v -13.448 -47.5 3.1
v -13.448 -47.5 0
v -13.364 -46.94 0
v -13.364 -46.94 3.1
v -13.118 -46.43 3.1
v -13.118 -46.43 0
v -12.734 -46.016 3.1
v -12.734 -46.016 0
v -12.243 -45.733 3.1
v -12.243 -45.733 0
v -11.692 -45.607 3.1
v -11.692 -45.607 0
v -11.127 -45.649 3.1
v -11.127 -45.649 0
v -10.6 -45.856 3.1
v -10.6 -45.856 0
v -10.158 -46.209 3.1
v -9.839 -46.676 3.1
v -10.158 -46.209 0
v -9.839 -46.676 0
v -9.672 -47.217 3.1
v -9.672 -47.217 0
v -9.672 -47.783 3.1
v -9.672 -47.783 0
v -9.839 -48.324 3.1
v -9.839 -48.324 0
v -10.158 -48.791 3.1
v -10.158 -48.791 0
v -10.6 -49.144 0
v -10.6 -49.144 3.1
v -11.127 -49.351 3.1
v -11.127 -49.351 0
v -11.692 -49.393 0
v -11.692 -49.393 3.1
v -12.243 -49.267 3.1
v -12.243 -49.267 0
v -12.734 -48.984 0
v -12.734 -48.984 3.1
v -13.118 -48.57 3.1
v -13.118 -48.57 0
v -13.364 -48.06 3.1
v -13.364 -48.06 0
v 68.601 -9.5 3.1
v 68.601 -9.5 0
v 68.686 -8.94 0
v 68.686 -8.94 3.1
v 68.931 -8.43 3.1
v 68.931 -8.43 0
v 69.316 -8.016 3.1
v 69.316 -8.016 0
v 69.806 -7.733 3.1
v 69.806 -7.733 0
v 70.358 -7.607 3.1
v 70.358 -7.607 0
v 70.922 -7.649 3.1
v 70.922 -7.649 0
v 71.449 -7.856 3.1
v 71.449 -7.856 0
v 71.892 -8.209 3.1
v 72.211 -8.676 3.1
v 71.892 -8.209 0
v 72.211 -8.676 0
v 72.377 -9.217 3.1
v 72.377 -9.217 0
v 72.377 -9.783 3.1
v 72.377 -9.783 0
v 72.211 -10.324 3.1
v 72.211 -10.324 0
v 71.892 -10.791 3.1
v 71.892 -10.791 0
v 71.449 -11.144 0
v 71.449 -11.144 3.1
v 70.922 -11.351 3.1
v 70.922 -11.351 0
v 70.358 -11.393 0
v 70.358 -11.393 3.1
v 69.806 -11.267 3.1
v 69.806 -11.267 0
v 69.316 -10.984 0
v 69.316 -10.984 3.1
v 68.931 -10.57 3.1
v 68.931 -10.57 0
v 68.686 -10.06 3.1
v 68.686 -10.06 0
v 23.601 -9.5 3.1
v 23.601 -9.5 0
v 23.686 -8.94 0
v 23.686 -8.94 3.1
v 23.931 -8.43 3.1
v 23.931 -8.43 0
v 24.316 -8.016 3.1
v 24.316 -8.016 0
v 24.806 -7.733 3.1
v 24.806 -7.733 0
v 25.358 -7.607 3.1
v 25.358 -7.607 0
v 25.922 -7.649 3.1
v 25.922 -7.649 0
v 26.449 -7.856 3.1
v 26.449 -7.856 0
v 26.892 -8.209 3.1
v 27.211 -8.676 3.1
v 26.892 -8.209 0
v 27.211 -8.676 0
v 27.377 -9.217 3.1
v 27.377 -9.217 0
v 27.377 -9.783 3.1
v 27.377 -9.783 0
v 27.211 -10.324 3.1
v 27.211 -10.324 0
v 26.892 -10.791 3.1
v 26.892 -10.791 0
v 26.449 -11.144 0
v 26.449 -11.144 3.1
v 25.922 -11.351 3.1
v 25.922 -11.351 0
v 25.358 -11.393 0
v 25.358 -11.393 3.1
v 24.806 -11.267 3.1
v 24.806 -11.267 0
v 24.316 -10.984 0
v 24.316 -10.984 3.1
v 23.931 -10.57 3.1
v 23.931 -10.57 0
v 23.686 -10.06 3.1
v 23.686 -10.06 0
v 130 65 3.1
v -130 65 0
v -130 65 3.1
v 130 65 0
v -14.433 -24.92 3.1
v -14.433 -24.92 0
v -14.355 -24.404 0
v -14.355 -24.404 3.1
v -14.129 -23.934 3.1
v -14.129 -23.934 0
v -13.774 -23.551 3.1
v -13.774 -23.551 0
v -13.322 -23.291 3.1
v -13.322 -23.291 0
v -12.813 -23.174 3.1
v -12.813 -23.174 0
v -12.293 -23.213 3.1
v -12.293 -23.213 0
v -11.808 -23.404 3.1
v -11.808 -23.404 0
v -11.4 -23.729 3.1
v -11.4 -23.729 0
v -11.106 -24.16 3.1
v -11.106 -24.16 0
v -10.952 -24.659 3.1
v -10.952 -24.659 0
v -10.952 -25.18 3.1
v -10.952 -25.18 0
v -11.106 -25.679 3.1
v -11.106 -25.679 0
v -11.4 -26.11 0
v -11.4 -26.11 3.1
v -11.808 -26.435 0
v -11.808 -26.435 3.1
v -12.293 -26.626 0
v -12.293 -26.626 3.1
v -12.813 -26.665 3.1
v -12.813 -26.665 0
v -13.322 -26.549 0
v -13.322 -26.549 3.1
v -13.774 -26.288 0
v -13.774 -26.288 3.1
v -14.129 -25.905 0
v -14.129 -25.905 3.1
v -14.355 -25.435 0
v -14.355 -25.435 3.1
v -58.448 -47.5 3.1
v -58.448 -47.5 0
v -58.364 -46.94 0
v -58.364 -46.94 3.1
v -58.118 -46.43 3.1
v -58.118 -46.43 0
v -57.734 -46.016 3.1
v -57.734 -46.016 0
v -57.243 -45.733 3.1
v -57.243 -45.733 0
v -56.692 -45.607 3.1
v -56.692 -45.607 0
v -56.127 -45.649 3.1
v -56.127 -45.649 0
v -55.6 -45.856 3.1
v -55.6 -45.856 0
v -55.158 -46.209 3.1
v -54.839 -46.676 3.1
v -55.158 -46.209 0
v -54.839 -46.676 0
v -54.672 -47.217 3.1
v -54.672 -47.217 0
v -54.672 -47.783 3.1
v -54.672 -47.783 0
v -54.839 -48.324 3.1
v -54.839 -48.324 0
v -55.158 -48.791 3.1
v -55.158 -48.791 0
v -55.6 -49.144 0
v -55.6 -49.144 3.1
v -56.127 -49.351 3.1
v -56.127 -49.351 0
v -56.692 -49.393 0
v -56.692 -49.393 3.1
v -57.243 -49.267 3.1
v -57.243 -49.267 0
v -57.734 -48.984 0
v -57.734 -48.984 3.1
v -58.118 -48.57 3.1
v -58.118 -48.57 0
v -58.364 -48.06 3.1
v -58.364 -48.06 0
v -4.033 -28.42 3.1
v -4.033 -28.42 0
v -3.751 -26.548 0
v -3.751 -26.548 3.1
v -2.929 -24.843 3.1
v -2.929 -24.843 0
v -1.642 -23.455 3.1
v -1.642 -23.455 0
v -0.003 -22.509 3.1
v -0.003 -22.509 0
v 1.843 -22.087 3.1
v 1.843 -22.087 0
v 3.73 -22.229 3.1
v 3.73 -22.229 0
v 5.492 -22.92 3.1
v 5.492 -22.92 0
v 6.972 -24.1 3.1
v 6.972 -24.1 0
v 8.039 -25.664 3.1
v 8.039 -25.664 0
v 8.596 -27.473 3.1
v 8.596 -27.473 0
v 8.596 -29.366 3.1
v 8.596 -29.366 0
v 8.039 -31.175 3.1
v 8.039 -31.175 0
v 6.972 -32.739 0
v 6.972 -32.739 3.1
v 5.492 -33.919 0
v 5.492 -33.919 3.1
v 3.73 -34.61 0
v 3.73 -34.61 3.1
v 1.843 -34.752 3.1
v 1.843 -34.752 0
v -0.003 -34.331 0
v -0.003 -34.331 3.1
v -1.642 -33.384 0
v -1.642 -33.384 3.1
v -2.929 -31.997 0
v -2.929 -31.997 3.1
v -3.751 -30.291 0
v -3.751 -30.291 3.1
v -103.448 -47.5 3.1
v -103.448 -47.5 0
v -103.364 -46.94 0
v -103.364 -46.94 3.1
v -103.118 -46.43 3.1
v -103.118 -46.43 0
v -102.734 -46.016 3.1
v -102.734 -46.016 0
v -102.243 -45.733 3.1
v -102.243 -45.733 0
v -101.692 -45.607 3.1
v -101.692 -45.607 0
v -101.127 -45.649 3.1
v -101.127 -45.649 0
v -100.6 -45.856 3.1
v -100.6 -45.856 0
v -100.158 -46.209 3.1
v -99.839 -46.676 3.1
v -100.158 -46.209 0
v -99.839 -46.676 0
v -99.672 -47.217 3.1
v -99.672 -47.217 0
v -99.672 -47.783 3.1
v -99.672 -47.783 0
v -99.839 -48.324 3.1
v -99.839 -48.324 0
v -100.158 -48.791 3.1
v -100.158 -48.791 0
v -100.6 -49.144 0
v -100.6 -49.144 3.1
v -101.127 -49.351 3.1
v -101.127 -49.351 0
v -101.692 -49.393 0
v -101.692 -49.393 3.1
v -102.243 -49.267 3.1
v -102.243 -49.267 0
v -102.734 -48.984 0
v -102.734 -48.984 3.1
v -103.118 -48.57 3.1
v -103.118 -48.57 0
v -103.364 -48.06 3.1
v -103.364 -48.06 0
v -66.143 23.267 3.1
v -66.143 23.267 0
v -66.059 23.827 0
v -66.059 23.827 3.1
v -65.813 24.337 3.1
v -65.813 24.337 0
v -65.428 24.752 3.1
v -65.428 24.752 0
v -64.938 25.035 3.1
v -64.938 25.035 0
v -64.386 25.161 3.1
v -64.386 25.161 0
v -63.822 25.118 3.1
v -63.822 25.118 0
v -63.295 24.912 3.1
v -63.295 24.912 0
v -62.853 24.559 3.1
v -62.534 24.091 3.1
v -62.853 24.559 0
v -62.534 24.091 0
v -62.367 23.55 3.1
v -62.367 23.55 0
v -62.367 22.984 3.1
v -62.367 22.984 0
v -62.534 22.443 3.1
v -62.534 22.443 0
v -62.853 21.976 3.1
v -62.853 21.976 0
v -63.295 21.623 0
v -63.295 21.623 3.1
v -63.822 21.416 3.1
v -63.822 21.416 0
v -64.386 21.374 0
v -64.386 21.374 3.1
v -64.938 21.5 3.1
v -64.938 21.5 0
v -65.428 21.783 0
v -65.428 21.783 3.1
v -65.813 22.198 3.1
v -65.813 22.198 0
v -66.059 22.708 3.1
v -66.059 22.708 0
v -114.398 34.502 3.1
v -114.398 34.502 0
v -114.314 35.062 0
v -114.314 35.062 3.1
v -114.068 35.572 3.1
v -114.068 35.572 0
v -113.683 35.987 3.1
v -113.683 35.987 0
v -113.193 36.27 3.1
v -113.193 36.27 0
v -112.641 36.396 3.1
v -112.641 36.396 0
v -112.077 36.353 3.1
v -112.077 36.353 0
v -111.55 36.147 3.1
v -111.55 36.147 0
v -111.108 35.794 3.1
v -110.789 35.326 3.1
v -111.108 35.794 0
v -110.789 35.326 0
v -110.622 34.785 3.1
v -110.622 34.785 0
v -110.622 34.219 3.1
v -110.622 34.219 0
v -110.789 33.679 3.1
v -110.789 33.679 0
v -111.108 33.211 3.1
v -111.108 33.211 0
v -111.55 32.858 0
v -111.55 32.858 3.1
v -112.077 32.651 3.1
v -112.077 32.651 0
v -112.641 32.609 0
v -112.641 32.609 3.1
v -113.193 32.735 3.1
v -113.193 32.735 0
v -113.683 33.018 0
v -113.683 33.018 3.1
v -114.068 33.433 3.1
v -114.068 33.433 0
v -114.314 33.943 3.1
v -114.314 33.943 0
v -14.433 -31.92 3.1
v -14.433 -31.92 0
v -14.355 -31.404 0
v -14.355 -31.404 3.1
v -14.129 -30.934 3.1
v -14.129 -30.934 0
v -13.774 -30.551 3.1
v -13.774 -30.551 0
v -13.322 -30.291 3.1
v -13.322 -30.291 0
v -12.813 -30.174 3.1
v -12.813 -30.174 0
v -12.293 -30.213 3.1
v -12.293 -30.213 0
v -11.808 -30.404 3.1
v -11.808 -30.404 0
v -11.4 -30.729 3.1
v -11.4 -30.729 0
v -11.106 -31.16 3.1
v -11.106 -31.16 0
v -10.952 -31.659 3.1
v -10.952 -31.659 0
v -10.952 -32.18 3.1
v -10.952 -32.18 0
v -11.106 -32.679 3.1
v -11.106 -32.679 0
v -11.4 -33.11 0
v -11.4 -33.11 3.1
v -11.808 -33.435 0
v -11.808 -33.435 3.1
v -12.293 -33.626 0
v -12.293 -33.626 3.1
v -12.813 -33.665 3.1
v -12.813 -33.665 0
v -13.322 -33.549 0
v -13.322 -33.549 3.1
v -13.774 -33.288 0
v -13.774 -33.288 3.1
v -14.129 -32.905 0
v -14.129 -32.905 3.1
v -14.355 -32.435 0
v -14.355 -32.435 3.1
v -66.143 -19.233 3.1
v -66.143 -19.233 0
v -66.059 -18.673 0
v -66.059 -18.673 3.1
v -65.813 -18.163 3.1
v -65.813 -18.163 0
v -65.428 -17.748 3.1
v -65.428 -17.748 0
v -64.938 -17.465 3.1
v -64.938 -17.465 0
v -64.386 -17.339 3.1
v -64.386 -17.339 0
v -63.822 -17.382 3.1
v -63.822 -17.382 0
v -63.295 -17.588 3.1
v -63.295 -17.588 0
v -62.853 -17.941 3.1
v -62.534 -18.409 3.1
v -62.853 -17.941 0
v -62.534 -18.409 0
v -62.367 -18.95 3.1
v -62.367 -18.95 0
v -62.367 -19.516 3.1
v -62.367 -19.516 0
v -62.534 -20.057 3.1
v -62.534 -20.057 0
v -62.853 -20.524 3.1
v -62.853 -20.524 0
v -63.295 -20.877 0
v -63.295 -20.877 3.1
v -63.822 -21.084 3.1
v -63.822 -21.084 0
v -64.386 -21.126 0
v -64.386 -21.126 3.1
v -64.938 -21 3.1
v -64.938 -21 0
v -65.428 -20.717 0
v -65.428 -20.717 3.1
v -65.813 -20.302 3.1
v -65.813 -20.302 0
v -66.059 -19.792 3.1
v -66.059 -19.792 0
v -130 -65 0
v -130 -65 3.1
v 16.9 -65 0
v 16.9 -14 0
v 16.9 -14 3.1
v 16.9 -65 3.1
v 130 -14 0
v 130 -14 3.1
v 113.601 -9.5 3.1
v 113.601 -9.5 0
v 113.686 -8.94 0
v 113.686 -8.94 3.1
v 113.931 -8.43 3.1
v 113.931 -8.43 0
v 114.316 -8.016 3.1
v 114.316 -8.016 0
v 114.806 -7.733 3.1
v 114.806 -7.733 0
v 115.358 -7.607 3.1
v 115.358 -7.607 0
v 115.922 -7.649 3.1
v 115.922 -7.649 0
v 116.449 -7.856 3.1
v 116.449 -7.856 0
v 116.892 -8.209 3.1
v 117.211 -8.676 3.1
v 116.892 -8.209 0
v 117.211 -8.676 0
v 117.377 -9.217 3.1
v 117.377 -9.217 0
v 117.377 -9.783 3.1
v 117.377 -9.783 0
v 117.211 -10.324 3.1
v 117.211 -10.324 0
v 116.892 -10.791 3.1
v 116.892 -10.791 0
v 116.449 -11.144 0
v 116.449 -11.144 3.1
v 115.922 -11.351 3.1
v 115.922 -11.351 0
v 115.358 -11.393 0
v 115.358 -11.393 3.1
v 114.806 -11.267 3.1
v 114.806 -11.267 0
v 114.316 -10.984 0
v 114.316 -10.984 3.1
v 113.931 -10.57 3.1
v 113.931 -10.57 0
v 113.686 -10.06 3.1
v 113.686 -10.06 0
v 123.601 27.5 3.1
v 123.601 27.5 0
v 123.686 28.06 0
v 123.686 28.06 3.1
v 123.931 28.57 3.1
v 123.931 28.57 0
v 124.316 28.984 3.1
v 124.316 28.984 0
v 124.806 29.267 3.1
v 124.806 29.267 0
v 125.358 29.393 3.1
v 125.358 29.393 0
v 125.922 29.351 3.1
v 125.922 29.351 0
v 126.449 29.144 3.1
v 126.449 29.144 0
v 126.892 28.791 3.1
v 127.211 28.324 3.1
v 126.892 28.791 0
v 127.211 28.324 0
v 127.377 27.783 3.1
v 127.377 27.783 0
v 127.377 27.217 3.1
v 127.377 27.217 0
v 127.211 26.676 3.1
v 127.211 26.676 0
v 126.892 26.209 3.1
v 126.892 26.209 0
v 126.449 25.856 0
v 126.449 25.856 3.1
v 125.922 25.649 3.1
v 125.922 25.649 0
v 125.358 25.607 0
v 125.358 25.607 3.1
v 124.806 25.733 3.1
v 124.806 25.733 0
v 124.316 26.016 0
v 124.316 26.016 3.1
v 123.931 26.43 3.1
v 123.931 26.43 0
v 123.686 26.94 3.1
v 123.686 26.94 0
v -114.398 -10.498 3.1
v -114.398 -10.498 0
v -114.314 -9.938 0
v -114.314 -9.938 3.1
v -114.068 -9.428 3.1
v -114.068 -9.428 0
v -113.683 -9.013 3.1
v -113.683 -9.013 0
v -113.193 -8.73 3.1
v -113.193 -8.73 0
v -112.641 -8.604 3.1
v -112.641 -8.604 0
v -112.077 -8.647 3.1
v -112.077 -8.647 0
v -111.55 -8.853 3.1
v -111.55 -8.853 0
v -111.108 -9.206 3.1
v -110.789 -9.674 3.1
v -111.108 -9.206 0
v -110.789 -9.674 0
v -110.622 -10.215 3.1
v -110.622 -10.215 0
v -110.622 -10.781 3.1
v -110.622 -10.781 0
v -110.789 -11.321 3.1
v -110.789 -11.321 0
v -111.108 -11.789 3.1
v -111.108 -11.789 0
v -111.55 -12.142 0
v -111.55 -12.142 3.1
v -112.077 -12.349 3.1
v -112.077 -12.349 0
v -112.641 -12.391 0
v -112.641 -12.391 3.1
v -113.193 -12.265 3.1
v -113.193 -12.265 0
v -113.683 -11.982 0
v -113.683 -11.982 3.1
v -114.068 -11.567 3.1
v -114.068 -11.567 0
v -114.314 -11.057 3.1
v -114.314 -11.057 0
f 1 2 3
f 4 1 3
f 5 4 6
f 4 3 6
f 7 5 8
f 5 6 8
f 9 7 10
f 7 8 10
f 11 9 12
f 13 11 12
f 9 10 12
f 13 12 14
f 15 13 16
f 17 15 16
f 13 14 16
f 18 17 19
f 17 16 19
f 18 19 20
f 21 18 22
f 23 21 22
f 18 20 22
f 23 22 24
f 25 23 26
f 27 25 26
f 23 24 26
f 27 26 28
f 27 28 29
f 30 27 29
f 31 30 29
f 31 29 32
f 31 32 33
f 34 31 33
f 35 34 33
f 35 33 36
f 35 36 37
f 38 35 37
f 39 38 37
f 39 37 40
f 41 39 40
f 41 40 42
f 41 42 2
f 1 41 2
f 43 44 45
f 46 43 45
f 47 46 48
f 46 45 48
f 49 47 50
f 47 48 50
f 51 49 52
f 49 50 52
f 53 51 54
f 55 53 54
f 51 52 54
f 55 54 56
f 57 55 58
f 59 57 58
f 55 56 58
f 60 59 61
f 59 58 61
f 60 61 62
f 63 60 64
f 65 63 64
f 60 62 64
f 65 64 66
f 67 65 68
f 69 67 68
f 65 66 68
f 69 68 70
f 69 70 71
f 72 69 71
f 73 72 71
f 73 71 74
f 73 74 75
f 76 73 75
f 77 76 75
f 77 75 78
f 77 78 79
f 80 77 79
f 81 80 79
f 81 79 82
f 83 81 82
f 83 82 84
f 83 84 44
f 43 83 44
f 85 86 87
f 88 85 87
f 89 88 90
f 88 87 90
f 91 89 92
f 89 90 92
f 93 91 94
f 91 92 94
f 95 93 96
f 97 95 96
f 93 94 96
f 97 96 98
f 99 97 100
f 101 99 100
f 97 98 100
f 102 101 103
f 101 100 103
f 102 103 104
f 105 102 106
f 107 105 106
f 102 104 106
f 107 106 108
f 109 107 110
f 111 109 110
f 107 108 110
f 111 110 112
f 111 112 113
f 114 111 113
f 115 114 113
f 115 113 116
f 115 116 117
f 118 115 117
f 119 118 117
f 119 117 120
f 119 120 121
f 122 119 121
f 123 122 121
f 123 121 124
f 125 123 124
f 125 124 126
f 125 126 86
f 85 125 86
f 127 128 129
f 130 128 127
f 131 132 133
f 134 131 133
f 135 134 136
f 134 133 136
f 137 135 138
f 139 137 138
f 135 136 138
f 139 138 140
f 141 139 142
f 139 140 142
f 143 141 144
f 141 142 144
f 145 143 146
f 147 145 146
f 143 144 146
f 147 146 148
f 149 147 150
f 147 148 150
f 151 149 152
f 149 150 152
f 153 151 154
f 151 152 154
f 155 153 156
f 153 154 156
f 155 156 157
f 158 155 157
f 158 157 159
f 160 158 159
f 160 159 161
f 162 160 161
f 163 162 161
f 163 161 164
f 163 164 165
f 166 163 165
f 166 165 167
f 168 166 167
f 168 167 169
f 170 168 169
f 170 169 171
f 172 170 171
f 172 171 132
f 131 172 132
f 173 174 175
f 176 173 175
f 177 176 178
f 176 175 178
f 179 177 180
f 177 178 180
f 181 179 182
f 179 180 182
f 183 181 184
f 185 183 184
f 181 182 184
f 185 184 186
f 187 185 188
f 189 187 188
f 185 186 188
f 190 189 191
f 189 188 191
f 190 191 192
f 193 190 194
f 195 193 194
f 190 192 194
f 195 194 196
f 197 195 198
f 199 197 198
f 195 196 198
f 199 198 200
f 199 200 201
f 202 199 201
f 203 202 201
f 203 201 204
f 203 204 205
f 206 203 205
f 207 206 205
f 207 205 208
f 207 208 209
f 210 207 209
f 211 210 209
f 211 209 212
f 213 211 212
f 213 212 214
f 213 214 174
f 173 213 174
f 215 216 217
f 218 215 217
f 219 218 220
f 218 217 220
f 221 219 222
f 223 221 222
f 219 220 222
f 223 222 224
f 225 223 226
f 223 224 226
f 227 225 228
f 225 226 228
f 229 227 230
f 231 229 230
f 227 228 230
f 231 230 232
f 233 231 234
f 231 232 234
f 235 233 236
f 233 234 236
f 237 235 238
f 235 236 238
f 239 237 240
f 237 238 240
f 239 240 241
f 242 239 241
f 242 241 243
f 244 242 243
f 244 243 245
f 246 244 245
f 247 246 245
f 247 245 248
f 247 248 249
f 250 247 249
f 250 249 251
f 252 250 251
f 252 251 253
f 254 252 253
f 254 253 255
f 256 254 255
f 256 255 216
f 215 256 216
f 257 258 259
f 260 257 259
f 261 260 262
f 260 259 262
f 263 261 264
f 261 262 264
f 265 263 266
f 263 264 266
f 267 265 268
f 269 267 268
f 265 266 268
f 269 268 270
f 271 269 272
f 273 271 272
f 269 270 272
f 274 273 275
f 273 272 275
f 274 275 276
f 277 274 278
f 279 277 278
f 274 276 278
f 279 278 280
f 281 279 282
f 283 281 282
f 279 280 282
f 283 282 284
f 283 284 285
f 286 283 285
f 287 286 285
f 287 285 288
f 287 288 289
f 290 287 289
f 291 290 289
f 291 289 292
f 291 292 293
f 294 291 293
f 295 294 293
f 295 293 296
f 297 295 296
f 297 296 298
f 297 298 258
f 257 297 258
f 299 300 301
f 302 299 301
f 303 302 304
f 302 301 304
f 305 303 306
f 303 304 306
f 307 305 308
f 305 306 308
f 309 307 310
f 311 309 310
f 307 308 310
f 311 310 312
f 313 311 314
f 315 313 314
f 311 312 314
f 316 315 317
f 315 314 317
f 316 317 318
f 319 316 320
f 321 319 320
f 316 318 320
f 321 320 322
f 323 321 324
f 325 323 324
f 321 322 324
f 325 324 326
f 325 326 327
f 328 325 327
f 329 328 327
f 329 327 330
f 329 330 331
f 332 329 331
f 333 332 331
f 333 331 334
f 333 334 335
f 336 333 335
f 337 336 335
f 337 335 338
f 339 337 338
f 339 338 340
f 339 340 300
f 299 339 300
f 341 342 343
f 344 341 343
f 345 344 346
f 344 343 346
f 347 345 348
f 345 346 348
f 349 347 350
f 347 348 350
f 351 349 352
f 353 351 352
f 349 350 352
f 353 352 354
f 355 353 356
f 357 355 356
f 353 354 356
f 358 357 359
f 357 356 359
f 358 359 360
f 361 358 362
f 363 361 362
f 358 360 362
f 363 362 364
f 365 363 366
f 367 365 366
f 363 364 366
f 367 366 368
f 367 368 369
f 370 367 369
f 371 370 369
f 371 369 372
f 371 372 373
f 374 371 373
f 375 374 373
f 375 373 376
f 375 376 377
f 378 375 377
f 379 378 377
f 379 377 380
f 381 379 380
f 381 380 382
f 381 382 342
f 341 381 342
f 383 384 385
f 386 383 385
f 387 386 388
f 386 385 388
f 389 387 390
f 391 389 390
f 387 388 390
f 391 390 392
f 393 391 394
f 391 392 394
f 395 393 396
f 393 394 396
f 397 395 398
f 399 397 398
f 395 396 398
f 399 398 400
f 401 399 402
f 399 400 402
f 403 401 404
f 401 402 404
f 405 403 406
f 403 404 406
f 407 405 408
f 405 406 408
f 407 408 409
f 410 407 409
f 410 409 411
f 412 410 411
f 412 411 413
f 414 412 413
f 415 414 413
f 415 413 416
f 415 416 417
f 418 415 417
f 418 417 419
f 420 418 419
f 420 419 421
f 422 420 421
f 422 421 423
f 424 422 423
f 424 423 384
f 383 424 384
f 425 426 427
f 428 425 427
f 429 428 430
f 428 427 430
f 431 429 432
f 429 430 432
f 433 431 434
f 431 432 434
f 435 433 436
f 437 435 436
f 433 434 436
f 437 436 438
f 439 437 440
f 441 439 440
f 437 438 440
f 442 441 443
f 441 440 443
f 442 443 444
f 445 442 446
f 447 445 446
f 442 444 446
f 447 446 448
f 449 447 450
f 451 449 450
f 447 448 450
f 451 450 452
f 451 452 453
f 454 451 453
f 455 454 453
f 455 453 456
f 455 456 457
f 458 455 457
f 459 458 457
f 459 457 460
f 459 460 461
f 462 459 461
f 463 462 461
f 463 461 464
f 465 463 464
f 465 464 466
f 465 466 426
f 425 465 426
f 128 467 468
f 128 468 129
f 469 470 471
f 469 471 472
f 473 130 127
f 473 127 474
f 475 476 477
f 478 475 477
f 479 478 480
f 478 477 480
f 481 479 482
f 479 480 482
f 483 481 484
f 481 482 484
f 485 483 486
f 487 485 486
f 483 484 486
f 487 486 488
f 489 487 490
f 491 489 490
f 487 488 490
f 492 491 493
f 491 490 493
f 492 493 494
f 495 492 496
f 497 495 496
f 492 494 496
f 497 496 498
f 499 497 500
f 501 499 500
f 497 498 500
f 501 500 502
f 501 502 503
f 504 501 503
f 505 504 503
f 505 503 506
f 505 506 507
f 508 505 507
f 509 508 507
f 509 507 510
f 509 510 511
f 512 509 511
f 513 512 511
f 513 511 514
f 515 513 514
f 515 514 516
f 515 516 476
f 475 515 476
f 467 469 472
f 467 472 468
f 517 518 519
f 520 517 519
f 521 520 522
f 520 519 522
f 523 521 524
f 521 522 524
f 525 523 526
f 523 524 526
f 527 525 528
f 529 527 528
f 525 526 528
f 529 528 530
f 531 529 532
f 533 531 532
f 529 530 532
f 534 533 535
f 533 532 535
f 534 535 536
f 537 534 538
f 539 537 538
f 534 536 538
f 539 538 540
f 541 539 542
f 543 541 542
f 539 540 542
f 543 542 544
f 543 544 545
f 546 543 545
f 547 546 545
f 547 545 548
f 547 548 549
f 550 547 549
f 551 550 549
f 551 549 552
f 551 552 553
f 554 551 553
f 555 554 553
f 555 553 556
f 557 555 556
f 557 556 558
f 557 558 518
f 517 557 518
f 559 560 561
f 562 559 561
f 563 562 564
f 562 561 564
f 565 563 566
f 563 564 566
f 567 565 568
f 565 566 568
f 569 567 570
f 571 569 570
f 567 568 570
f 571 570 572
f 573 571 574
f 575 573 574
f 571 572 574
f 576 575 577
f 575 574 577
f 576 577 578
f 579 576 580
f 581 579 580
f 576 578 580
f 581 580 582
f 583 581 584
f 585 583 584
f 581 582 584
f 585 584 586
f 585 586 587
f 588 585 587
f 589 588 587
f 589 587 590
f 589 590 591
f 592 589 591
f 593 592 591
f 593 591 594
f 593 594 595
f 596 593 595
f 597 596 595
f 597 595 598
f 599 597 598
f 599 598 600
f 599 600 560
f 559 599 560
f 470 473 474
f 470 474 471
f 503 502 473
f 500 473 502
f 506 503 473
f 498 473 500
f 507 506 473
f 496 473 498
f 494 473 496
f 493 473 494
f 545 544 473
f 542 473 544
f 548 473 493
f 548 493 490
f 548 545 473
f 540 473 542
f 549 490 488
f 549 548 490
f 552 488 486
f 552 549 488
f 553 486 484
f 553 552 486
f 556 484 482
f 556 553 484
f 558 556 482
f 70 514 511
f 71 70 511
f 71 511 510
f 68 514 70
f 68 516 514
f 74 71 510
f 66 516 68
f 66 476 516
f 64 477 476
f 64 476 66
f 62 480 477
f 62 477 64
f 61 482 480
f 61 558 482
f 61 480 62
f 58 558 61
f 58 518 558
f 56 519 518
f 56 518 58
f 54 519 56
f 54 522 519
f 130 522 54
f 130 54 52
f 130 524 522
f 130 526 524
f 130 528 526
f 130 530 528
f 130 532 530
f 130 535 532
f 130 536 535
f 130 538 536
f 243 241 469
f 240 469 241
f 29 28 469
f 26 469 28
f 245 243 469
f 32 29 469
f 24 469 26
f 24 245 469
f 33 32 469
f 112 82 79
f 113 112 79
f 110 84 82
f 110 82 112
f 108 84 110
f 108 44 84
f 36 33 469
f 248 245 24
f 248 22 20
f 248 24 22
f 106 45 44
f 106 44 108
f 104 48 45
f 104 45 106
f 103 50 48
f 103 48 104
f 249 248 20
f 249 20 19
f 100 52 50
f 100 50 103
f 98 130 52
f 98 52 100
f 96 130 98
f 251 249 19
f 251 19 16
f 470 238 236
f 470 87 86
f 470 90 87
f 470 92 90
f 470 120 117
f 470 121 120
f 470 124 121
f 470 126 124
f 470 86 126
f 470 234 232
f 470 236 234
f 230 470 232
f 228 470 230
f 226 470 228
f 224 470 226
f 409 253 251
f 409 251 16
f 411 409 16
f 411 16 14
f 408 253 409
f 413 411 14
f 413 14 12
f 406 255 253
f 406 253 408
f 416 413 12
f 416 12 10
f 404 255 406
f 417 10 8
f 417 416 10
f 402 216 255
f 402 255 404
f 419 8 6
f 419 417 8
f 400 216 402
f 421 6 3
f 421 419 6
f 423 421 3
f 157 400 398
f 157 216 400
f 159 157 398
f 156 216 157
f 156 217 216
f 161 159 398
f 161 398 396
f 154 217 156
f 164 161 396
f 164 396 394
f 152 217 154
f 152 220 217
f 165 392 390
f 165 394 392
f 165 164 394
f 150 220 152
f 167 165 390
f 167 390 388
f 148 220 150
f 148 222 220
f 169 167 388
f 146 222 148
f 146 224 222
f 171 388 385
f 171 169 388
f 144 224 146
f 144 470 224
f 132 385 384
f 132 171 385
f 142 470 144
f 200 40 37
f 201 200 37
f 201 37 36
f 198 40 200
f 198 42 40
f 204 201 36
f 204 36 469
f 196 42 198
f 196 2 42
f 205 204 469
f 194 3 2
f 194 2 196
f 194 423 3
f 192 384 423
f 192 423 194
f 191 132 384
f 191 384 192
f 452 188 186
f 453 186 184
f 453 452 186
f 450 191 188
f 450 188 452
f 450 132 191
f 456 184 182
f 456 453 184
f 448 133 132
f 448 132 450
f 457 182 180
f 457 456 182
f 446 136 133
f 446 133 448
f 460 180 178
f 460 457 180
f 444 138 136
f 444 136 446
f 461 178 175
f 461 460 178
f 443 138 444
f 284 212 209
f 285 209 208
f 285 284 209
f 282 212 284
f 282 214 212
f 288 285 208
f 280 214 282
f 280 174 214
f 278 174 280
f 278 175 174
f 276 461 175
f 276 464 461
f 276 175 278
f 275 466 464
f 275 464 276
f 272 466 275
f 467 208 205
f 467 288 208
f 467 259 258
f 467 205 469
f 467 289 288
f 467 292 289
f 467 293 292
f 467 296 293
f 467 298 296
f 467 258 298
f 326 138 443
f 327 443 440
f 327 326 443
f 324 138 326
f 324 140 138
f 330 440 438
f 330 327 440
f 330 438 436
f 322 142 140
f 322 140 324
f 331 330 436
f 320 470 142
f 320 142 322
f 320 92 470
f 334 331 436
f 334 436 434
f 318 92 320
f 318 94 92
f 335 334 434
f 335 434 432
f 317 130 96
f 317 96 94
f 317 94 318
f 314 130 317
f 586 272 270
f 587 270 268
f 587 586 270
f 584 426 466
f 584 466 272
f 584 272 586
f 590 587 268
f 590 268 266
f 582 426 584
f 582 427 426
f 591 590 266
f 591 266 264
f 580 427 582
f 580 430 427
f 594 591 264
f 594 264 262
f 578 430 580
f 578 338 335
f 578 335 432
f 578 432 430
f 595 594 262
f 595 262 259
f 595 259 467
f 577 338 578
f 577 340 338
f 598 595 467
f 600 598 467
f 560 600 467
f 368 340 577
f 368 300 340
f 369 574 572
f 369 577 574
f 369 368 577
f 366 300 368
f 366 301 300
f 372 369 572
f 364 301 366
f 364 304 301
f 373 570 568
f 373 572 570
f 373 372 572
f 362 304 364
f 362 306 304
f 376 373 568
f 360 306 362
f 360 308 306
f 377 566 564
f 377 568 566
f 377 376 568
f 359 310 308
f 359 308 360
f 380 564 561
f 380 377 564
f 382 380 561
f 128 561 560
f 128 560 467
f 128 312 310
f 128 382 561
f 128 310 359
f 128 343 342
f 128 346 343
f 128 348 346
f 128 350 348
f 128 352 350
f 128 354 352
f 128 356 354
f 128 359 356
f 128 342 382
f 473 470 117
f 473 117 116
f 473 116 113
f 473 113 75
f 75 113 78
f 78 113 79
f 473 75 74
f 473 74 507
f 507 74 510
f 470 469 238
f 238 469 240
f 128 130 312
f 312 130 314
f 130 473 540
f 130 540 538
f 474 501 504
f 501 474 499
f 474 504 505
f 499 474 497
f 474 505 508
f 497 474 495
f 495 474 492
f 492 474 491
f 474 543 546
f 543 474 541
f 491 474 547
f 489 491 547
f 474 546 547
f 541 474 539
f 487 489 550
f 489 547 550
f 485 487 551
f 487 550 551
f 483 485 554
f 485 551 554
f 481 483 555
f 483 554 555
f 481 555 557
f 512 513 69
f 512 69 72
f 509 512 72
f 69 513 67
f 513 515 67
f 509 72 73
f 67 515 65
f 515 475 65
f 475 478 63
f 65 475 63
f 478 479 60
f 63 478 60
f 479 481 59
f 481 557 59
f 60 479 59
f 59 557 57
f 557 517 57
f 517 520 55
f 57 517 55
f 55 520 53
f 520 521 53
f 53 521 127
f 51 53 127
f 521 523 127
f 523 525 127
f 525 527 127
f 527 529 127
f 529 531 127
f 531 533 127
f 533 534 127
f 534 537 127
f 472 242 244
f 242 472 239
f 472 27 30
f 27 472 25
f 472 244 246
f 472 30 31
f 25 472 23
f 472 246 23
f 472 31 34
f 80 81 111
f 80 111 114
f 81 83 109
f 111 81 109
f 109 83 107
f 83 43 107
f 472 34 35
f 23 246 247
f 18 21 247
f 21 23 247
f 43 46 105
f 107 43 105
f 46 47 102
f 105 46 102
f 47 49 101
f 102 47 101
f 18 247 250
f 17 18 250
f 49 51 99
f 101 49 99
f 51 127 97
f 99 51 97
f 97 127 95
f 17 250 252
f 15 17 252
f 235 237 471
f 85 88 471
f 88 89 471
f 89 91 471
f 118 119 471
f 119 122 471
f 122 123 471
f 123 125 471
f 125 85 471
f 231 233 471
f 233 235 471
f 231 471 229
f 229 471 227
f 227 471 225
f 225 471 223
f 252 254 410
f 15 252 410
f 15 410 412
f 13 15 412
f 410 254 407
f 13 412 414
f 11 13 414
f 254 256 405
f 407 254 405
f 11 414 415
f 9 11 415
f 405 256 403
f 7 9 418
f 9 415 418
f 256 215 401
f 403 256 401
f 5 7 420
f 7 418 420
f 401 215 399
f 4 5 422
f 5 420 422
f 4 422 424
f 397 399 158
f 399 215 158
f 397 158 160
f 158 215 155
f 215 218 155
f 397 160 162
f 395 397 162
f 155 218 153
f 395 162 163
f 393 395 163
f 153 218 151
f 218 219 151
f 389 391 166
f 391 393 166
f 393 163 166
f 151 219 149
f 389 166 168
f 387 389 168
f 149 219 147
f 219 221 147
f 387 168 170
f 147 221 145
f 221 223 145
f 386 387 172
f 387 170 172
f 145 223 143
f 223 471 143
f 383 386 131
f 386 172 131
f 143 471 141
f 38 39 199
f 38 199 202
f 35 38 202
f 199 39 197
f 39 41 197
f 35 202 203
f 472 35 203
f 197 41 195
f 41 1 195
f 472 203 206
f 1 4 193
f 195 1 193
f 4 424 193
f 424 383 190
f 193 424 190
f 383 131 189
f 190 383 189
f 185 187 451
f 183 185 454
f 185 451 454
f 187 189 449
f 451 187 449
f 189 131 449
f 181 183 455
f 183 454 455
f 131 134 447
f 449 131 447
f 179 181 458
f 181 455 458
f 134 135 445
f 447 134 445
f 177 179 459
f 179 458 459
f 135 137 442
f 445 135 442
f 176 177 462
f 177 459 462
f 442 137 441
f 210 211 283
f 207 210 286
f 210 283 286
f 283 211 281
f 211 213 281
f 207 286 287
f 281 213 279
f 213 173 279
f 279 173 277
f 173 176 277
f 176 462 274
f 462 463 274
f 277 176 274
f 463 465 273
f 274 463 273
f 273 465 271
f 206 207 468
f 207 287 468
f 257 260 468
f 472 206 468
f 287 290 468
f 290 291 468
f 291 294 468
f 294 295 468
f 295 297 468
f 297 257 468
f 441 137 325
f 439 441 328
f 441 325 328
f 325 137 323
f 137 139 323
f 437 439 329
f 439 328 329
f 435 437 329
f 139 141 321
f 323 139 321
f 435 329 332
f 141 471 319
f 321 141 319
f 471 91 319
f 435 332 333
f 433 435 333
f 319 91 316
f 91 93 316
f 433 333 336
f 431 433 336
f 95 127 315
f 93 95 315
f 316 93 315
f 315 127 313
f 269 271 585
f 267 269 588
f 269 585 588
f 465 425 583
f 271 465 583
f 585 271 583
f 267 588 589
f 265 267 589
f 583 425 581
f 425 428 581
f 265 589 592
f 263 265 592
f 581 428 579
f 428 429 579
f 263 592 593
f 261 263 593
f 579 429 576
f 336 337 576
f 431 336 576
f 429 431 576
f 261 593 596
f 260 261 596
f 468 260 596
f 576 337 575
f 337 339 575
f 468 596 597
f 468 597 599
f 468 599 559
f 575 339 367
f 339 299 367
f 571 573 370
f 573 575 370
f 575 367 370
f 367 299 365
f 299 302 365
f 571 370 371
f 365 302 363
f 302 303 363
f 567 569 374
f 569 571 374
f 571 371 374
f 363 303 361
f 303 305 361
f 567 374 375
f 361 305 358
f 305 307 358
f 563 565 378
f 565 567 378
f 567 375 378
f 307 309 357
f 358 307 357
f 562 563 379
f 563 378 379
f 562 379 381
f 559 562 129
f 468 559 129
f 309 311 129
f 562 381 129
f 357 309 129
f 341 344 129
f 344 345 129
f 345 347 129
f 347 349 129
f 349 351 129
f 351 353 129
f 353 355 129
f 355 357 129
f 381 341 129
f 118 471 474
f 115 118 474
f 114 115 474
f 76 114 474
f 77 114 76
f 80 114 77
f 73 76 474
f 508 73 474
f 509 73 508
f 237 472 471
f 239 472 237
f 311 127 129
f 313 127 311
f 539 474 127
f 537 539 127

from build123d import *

# Parameters (mm, degrees)
BOSS_EXTRUDE1_DEPTH   = 3.1
F_6_CLEARANCE_HOLE1_D = 3.7973
F_6_CLEARANCE_HOLE2_D = 3.7973
SKETCH8_R             = 6.35
SKETCH8_R_2           = 1.75
CUT_EXTRUDE1_DEPTH    = 4.1


with BuildPart() as part:
    # Sketch1 → Boss-Extrude1 (new body)
    with BuildSketch(Plane.XY):
        Polygon((130, -14), (16.9, -14), (16.9, -65), (-130, -65), (-130, 65), (130, 65), align=None)
    extrude(amount=BOSS_EXTRUDE1_DEPTH)

    # #6 Clearance Hole1 (through all)
    with Locations(Plane.XY.offset(3.1)):
        with Locations((25.5, -9.5), (70.5, -9.5), (115.5, -9.5), (-11.54975, -47.5), (-56.54975, -47.5), (-101.54975, -47.5), (125.5, 27.5), (-64.244394137, -19.232770082), (-64.244394137, 23.267229918)):
            Hole(F_6_CLEARANCE_HOLE1_D / 2)

    # #6 Clearance Hole2 (through all)
    with Locations(Plane.XY.offset(3.1)):
        with Locations((-112.4995, 34.5024), (-112.4995, -10.4976)):
            Hole(F_6_CLEARANCE_HOLE2_D / 2)

    # Sketch8 → Cut-Extrude1 (cut, through all)
    with BuildSketch(Plane(origin=(0, 0, 0), x_dir=(-1, 0, 0), z_dir=(0, 0, -1))):
        with Locations((-2.31737005, -28.419585766)):
            Circle(SKETCH8_R)
        with Locations((12.68262995, -24.919585766)):
            Circle(SKETCH8_R_2)
        with Locations((12.68262995, -31.919585766)):
            Circle(SKETCH8_R_2)
    extrude(amount=-CUT_EXTRUDE1_DEPTH, mode=Mode.SUBTRACT)


solid = part.part
